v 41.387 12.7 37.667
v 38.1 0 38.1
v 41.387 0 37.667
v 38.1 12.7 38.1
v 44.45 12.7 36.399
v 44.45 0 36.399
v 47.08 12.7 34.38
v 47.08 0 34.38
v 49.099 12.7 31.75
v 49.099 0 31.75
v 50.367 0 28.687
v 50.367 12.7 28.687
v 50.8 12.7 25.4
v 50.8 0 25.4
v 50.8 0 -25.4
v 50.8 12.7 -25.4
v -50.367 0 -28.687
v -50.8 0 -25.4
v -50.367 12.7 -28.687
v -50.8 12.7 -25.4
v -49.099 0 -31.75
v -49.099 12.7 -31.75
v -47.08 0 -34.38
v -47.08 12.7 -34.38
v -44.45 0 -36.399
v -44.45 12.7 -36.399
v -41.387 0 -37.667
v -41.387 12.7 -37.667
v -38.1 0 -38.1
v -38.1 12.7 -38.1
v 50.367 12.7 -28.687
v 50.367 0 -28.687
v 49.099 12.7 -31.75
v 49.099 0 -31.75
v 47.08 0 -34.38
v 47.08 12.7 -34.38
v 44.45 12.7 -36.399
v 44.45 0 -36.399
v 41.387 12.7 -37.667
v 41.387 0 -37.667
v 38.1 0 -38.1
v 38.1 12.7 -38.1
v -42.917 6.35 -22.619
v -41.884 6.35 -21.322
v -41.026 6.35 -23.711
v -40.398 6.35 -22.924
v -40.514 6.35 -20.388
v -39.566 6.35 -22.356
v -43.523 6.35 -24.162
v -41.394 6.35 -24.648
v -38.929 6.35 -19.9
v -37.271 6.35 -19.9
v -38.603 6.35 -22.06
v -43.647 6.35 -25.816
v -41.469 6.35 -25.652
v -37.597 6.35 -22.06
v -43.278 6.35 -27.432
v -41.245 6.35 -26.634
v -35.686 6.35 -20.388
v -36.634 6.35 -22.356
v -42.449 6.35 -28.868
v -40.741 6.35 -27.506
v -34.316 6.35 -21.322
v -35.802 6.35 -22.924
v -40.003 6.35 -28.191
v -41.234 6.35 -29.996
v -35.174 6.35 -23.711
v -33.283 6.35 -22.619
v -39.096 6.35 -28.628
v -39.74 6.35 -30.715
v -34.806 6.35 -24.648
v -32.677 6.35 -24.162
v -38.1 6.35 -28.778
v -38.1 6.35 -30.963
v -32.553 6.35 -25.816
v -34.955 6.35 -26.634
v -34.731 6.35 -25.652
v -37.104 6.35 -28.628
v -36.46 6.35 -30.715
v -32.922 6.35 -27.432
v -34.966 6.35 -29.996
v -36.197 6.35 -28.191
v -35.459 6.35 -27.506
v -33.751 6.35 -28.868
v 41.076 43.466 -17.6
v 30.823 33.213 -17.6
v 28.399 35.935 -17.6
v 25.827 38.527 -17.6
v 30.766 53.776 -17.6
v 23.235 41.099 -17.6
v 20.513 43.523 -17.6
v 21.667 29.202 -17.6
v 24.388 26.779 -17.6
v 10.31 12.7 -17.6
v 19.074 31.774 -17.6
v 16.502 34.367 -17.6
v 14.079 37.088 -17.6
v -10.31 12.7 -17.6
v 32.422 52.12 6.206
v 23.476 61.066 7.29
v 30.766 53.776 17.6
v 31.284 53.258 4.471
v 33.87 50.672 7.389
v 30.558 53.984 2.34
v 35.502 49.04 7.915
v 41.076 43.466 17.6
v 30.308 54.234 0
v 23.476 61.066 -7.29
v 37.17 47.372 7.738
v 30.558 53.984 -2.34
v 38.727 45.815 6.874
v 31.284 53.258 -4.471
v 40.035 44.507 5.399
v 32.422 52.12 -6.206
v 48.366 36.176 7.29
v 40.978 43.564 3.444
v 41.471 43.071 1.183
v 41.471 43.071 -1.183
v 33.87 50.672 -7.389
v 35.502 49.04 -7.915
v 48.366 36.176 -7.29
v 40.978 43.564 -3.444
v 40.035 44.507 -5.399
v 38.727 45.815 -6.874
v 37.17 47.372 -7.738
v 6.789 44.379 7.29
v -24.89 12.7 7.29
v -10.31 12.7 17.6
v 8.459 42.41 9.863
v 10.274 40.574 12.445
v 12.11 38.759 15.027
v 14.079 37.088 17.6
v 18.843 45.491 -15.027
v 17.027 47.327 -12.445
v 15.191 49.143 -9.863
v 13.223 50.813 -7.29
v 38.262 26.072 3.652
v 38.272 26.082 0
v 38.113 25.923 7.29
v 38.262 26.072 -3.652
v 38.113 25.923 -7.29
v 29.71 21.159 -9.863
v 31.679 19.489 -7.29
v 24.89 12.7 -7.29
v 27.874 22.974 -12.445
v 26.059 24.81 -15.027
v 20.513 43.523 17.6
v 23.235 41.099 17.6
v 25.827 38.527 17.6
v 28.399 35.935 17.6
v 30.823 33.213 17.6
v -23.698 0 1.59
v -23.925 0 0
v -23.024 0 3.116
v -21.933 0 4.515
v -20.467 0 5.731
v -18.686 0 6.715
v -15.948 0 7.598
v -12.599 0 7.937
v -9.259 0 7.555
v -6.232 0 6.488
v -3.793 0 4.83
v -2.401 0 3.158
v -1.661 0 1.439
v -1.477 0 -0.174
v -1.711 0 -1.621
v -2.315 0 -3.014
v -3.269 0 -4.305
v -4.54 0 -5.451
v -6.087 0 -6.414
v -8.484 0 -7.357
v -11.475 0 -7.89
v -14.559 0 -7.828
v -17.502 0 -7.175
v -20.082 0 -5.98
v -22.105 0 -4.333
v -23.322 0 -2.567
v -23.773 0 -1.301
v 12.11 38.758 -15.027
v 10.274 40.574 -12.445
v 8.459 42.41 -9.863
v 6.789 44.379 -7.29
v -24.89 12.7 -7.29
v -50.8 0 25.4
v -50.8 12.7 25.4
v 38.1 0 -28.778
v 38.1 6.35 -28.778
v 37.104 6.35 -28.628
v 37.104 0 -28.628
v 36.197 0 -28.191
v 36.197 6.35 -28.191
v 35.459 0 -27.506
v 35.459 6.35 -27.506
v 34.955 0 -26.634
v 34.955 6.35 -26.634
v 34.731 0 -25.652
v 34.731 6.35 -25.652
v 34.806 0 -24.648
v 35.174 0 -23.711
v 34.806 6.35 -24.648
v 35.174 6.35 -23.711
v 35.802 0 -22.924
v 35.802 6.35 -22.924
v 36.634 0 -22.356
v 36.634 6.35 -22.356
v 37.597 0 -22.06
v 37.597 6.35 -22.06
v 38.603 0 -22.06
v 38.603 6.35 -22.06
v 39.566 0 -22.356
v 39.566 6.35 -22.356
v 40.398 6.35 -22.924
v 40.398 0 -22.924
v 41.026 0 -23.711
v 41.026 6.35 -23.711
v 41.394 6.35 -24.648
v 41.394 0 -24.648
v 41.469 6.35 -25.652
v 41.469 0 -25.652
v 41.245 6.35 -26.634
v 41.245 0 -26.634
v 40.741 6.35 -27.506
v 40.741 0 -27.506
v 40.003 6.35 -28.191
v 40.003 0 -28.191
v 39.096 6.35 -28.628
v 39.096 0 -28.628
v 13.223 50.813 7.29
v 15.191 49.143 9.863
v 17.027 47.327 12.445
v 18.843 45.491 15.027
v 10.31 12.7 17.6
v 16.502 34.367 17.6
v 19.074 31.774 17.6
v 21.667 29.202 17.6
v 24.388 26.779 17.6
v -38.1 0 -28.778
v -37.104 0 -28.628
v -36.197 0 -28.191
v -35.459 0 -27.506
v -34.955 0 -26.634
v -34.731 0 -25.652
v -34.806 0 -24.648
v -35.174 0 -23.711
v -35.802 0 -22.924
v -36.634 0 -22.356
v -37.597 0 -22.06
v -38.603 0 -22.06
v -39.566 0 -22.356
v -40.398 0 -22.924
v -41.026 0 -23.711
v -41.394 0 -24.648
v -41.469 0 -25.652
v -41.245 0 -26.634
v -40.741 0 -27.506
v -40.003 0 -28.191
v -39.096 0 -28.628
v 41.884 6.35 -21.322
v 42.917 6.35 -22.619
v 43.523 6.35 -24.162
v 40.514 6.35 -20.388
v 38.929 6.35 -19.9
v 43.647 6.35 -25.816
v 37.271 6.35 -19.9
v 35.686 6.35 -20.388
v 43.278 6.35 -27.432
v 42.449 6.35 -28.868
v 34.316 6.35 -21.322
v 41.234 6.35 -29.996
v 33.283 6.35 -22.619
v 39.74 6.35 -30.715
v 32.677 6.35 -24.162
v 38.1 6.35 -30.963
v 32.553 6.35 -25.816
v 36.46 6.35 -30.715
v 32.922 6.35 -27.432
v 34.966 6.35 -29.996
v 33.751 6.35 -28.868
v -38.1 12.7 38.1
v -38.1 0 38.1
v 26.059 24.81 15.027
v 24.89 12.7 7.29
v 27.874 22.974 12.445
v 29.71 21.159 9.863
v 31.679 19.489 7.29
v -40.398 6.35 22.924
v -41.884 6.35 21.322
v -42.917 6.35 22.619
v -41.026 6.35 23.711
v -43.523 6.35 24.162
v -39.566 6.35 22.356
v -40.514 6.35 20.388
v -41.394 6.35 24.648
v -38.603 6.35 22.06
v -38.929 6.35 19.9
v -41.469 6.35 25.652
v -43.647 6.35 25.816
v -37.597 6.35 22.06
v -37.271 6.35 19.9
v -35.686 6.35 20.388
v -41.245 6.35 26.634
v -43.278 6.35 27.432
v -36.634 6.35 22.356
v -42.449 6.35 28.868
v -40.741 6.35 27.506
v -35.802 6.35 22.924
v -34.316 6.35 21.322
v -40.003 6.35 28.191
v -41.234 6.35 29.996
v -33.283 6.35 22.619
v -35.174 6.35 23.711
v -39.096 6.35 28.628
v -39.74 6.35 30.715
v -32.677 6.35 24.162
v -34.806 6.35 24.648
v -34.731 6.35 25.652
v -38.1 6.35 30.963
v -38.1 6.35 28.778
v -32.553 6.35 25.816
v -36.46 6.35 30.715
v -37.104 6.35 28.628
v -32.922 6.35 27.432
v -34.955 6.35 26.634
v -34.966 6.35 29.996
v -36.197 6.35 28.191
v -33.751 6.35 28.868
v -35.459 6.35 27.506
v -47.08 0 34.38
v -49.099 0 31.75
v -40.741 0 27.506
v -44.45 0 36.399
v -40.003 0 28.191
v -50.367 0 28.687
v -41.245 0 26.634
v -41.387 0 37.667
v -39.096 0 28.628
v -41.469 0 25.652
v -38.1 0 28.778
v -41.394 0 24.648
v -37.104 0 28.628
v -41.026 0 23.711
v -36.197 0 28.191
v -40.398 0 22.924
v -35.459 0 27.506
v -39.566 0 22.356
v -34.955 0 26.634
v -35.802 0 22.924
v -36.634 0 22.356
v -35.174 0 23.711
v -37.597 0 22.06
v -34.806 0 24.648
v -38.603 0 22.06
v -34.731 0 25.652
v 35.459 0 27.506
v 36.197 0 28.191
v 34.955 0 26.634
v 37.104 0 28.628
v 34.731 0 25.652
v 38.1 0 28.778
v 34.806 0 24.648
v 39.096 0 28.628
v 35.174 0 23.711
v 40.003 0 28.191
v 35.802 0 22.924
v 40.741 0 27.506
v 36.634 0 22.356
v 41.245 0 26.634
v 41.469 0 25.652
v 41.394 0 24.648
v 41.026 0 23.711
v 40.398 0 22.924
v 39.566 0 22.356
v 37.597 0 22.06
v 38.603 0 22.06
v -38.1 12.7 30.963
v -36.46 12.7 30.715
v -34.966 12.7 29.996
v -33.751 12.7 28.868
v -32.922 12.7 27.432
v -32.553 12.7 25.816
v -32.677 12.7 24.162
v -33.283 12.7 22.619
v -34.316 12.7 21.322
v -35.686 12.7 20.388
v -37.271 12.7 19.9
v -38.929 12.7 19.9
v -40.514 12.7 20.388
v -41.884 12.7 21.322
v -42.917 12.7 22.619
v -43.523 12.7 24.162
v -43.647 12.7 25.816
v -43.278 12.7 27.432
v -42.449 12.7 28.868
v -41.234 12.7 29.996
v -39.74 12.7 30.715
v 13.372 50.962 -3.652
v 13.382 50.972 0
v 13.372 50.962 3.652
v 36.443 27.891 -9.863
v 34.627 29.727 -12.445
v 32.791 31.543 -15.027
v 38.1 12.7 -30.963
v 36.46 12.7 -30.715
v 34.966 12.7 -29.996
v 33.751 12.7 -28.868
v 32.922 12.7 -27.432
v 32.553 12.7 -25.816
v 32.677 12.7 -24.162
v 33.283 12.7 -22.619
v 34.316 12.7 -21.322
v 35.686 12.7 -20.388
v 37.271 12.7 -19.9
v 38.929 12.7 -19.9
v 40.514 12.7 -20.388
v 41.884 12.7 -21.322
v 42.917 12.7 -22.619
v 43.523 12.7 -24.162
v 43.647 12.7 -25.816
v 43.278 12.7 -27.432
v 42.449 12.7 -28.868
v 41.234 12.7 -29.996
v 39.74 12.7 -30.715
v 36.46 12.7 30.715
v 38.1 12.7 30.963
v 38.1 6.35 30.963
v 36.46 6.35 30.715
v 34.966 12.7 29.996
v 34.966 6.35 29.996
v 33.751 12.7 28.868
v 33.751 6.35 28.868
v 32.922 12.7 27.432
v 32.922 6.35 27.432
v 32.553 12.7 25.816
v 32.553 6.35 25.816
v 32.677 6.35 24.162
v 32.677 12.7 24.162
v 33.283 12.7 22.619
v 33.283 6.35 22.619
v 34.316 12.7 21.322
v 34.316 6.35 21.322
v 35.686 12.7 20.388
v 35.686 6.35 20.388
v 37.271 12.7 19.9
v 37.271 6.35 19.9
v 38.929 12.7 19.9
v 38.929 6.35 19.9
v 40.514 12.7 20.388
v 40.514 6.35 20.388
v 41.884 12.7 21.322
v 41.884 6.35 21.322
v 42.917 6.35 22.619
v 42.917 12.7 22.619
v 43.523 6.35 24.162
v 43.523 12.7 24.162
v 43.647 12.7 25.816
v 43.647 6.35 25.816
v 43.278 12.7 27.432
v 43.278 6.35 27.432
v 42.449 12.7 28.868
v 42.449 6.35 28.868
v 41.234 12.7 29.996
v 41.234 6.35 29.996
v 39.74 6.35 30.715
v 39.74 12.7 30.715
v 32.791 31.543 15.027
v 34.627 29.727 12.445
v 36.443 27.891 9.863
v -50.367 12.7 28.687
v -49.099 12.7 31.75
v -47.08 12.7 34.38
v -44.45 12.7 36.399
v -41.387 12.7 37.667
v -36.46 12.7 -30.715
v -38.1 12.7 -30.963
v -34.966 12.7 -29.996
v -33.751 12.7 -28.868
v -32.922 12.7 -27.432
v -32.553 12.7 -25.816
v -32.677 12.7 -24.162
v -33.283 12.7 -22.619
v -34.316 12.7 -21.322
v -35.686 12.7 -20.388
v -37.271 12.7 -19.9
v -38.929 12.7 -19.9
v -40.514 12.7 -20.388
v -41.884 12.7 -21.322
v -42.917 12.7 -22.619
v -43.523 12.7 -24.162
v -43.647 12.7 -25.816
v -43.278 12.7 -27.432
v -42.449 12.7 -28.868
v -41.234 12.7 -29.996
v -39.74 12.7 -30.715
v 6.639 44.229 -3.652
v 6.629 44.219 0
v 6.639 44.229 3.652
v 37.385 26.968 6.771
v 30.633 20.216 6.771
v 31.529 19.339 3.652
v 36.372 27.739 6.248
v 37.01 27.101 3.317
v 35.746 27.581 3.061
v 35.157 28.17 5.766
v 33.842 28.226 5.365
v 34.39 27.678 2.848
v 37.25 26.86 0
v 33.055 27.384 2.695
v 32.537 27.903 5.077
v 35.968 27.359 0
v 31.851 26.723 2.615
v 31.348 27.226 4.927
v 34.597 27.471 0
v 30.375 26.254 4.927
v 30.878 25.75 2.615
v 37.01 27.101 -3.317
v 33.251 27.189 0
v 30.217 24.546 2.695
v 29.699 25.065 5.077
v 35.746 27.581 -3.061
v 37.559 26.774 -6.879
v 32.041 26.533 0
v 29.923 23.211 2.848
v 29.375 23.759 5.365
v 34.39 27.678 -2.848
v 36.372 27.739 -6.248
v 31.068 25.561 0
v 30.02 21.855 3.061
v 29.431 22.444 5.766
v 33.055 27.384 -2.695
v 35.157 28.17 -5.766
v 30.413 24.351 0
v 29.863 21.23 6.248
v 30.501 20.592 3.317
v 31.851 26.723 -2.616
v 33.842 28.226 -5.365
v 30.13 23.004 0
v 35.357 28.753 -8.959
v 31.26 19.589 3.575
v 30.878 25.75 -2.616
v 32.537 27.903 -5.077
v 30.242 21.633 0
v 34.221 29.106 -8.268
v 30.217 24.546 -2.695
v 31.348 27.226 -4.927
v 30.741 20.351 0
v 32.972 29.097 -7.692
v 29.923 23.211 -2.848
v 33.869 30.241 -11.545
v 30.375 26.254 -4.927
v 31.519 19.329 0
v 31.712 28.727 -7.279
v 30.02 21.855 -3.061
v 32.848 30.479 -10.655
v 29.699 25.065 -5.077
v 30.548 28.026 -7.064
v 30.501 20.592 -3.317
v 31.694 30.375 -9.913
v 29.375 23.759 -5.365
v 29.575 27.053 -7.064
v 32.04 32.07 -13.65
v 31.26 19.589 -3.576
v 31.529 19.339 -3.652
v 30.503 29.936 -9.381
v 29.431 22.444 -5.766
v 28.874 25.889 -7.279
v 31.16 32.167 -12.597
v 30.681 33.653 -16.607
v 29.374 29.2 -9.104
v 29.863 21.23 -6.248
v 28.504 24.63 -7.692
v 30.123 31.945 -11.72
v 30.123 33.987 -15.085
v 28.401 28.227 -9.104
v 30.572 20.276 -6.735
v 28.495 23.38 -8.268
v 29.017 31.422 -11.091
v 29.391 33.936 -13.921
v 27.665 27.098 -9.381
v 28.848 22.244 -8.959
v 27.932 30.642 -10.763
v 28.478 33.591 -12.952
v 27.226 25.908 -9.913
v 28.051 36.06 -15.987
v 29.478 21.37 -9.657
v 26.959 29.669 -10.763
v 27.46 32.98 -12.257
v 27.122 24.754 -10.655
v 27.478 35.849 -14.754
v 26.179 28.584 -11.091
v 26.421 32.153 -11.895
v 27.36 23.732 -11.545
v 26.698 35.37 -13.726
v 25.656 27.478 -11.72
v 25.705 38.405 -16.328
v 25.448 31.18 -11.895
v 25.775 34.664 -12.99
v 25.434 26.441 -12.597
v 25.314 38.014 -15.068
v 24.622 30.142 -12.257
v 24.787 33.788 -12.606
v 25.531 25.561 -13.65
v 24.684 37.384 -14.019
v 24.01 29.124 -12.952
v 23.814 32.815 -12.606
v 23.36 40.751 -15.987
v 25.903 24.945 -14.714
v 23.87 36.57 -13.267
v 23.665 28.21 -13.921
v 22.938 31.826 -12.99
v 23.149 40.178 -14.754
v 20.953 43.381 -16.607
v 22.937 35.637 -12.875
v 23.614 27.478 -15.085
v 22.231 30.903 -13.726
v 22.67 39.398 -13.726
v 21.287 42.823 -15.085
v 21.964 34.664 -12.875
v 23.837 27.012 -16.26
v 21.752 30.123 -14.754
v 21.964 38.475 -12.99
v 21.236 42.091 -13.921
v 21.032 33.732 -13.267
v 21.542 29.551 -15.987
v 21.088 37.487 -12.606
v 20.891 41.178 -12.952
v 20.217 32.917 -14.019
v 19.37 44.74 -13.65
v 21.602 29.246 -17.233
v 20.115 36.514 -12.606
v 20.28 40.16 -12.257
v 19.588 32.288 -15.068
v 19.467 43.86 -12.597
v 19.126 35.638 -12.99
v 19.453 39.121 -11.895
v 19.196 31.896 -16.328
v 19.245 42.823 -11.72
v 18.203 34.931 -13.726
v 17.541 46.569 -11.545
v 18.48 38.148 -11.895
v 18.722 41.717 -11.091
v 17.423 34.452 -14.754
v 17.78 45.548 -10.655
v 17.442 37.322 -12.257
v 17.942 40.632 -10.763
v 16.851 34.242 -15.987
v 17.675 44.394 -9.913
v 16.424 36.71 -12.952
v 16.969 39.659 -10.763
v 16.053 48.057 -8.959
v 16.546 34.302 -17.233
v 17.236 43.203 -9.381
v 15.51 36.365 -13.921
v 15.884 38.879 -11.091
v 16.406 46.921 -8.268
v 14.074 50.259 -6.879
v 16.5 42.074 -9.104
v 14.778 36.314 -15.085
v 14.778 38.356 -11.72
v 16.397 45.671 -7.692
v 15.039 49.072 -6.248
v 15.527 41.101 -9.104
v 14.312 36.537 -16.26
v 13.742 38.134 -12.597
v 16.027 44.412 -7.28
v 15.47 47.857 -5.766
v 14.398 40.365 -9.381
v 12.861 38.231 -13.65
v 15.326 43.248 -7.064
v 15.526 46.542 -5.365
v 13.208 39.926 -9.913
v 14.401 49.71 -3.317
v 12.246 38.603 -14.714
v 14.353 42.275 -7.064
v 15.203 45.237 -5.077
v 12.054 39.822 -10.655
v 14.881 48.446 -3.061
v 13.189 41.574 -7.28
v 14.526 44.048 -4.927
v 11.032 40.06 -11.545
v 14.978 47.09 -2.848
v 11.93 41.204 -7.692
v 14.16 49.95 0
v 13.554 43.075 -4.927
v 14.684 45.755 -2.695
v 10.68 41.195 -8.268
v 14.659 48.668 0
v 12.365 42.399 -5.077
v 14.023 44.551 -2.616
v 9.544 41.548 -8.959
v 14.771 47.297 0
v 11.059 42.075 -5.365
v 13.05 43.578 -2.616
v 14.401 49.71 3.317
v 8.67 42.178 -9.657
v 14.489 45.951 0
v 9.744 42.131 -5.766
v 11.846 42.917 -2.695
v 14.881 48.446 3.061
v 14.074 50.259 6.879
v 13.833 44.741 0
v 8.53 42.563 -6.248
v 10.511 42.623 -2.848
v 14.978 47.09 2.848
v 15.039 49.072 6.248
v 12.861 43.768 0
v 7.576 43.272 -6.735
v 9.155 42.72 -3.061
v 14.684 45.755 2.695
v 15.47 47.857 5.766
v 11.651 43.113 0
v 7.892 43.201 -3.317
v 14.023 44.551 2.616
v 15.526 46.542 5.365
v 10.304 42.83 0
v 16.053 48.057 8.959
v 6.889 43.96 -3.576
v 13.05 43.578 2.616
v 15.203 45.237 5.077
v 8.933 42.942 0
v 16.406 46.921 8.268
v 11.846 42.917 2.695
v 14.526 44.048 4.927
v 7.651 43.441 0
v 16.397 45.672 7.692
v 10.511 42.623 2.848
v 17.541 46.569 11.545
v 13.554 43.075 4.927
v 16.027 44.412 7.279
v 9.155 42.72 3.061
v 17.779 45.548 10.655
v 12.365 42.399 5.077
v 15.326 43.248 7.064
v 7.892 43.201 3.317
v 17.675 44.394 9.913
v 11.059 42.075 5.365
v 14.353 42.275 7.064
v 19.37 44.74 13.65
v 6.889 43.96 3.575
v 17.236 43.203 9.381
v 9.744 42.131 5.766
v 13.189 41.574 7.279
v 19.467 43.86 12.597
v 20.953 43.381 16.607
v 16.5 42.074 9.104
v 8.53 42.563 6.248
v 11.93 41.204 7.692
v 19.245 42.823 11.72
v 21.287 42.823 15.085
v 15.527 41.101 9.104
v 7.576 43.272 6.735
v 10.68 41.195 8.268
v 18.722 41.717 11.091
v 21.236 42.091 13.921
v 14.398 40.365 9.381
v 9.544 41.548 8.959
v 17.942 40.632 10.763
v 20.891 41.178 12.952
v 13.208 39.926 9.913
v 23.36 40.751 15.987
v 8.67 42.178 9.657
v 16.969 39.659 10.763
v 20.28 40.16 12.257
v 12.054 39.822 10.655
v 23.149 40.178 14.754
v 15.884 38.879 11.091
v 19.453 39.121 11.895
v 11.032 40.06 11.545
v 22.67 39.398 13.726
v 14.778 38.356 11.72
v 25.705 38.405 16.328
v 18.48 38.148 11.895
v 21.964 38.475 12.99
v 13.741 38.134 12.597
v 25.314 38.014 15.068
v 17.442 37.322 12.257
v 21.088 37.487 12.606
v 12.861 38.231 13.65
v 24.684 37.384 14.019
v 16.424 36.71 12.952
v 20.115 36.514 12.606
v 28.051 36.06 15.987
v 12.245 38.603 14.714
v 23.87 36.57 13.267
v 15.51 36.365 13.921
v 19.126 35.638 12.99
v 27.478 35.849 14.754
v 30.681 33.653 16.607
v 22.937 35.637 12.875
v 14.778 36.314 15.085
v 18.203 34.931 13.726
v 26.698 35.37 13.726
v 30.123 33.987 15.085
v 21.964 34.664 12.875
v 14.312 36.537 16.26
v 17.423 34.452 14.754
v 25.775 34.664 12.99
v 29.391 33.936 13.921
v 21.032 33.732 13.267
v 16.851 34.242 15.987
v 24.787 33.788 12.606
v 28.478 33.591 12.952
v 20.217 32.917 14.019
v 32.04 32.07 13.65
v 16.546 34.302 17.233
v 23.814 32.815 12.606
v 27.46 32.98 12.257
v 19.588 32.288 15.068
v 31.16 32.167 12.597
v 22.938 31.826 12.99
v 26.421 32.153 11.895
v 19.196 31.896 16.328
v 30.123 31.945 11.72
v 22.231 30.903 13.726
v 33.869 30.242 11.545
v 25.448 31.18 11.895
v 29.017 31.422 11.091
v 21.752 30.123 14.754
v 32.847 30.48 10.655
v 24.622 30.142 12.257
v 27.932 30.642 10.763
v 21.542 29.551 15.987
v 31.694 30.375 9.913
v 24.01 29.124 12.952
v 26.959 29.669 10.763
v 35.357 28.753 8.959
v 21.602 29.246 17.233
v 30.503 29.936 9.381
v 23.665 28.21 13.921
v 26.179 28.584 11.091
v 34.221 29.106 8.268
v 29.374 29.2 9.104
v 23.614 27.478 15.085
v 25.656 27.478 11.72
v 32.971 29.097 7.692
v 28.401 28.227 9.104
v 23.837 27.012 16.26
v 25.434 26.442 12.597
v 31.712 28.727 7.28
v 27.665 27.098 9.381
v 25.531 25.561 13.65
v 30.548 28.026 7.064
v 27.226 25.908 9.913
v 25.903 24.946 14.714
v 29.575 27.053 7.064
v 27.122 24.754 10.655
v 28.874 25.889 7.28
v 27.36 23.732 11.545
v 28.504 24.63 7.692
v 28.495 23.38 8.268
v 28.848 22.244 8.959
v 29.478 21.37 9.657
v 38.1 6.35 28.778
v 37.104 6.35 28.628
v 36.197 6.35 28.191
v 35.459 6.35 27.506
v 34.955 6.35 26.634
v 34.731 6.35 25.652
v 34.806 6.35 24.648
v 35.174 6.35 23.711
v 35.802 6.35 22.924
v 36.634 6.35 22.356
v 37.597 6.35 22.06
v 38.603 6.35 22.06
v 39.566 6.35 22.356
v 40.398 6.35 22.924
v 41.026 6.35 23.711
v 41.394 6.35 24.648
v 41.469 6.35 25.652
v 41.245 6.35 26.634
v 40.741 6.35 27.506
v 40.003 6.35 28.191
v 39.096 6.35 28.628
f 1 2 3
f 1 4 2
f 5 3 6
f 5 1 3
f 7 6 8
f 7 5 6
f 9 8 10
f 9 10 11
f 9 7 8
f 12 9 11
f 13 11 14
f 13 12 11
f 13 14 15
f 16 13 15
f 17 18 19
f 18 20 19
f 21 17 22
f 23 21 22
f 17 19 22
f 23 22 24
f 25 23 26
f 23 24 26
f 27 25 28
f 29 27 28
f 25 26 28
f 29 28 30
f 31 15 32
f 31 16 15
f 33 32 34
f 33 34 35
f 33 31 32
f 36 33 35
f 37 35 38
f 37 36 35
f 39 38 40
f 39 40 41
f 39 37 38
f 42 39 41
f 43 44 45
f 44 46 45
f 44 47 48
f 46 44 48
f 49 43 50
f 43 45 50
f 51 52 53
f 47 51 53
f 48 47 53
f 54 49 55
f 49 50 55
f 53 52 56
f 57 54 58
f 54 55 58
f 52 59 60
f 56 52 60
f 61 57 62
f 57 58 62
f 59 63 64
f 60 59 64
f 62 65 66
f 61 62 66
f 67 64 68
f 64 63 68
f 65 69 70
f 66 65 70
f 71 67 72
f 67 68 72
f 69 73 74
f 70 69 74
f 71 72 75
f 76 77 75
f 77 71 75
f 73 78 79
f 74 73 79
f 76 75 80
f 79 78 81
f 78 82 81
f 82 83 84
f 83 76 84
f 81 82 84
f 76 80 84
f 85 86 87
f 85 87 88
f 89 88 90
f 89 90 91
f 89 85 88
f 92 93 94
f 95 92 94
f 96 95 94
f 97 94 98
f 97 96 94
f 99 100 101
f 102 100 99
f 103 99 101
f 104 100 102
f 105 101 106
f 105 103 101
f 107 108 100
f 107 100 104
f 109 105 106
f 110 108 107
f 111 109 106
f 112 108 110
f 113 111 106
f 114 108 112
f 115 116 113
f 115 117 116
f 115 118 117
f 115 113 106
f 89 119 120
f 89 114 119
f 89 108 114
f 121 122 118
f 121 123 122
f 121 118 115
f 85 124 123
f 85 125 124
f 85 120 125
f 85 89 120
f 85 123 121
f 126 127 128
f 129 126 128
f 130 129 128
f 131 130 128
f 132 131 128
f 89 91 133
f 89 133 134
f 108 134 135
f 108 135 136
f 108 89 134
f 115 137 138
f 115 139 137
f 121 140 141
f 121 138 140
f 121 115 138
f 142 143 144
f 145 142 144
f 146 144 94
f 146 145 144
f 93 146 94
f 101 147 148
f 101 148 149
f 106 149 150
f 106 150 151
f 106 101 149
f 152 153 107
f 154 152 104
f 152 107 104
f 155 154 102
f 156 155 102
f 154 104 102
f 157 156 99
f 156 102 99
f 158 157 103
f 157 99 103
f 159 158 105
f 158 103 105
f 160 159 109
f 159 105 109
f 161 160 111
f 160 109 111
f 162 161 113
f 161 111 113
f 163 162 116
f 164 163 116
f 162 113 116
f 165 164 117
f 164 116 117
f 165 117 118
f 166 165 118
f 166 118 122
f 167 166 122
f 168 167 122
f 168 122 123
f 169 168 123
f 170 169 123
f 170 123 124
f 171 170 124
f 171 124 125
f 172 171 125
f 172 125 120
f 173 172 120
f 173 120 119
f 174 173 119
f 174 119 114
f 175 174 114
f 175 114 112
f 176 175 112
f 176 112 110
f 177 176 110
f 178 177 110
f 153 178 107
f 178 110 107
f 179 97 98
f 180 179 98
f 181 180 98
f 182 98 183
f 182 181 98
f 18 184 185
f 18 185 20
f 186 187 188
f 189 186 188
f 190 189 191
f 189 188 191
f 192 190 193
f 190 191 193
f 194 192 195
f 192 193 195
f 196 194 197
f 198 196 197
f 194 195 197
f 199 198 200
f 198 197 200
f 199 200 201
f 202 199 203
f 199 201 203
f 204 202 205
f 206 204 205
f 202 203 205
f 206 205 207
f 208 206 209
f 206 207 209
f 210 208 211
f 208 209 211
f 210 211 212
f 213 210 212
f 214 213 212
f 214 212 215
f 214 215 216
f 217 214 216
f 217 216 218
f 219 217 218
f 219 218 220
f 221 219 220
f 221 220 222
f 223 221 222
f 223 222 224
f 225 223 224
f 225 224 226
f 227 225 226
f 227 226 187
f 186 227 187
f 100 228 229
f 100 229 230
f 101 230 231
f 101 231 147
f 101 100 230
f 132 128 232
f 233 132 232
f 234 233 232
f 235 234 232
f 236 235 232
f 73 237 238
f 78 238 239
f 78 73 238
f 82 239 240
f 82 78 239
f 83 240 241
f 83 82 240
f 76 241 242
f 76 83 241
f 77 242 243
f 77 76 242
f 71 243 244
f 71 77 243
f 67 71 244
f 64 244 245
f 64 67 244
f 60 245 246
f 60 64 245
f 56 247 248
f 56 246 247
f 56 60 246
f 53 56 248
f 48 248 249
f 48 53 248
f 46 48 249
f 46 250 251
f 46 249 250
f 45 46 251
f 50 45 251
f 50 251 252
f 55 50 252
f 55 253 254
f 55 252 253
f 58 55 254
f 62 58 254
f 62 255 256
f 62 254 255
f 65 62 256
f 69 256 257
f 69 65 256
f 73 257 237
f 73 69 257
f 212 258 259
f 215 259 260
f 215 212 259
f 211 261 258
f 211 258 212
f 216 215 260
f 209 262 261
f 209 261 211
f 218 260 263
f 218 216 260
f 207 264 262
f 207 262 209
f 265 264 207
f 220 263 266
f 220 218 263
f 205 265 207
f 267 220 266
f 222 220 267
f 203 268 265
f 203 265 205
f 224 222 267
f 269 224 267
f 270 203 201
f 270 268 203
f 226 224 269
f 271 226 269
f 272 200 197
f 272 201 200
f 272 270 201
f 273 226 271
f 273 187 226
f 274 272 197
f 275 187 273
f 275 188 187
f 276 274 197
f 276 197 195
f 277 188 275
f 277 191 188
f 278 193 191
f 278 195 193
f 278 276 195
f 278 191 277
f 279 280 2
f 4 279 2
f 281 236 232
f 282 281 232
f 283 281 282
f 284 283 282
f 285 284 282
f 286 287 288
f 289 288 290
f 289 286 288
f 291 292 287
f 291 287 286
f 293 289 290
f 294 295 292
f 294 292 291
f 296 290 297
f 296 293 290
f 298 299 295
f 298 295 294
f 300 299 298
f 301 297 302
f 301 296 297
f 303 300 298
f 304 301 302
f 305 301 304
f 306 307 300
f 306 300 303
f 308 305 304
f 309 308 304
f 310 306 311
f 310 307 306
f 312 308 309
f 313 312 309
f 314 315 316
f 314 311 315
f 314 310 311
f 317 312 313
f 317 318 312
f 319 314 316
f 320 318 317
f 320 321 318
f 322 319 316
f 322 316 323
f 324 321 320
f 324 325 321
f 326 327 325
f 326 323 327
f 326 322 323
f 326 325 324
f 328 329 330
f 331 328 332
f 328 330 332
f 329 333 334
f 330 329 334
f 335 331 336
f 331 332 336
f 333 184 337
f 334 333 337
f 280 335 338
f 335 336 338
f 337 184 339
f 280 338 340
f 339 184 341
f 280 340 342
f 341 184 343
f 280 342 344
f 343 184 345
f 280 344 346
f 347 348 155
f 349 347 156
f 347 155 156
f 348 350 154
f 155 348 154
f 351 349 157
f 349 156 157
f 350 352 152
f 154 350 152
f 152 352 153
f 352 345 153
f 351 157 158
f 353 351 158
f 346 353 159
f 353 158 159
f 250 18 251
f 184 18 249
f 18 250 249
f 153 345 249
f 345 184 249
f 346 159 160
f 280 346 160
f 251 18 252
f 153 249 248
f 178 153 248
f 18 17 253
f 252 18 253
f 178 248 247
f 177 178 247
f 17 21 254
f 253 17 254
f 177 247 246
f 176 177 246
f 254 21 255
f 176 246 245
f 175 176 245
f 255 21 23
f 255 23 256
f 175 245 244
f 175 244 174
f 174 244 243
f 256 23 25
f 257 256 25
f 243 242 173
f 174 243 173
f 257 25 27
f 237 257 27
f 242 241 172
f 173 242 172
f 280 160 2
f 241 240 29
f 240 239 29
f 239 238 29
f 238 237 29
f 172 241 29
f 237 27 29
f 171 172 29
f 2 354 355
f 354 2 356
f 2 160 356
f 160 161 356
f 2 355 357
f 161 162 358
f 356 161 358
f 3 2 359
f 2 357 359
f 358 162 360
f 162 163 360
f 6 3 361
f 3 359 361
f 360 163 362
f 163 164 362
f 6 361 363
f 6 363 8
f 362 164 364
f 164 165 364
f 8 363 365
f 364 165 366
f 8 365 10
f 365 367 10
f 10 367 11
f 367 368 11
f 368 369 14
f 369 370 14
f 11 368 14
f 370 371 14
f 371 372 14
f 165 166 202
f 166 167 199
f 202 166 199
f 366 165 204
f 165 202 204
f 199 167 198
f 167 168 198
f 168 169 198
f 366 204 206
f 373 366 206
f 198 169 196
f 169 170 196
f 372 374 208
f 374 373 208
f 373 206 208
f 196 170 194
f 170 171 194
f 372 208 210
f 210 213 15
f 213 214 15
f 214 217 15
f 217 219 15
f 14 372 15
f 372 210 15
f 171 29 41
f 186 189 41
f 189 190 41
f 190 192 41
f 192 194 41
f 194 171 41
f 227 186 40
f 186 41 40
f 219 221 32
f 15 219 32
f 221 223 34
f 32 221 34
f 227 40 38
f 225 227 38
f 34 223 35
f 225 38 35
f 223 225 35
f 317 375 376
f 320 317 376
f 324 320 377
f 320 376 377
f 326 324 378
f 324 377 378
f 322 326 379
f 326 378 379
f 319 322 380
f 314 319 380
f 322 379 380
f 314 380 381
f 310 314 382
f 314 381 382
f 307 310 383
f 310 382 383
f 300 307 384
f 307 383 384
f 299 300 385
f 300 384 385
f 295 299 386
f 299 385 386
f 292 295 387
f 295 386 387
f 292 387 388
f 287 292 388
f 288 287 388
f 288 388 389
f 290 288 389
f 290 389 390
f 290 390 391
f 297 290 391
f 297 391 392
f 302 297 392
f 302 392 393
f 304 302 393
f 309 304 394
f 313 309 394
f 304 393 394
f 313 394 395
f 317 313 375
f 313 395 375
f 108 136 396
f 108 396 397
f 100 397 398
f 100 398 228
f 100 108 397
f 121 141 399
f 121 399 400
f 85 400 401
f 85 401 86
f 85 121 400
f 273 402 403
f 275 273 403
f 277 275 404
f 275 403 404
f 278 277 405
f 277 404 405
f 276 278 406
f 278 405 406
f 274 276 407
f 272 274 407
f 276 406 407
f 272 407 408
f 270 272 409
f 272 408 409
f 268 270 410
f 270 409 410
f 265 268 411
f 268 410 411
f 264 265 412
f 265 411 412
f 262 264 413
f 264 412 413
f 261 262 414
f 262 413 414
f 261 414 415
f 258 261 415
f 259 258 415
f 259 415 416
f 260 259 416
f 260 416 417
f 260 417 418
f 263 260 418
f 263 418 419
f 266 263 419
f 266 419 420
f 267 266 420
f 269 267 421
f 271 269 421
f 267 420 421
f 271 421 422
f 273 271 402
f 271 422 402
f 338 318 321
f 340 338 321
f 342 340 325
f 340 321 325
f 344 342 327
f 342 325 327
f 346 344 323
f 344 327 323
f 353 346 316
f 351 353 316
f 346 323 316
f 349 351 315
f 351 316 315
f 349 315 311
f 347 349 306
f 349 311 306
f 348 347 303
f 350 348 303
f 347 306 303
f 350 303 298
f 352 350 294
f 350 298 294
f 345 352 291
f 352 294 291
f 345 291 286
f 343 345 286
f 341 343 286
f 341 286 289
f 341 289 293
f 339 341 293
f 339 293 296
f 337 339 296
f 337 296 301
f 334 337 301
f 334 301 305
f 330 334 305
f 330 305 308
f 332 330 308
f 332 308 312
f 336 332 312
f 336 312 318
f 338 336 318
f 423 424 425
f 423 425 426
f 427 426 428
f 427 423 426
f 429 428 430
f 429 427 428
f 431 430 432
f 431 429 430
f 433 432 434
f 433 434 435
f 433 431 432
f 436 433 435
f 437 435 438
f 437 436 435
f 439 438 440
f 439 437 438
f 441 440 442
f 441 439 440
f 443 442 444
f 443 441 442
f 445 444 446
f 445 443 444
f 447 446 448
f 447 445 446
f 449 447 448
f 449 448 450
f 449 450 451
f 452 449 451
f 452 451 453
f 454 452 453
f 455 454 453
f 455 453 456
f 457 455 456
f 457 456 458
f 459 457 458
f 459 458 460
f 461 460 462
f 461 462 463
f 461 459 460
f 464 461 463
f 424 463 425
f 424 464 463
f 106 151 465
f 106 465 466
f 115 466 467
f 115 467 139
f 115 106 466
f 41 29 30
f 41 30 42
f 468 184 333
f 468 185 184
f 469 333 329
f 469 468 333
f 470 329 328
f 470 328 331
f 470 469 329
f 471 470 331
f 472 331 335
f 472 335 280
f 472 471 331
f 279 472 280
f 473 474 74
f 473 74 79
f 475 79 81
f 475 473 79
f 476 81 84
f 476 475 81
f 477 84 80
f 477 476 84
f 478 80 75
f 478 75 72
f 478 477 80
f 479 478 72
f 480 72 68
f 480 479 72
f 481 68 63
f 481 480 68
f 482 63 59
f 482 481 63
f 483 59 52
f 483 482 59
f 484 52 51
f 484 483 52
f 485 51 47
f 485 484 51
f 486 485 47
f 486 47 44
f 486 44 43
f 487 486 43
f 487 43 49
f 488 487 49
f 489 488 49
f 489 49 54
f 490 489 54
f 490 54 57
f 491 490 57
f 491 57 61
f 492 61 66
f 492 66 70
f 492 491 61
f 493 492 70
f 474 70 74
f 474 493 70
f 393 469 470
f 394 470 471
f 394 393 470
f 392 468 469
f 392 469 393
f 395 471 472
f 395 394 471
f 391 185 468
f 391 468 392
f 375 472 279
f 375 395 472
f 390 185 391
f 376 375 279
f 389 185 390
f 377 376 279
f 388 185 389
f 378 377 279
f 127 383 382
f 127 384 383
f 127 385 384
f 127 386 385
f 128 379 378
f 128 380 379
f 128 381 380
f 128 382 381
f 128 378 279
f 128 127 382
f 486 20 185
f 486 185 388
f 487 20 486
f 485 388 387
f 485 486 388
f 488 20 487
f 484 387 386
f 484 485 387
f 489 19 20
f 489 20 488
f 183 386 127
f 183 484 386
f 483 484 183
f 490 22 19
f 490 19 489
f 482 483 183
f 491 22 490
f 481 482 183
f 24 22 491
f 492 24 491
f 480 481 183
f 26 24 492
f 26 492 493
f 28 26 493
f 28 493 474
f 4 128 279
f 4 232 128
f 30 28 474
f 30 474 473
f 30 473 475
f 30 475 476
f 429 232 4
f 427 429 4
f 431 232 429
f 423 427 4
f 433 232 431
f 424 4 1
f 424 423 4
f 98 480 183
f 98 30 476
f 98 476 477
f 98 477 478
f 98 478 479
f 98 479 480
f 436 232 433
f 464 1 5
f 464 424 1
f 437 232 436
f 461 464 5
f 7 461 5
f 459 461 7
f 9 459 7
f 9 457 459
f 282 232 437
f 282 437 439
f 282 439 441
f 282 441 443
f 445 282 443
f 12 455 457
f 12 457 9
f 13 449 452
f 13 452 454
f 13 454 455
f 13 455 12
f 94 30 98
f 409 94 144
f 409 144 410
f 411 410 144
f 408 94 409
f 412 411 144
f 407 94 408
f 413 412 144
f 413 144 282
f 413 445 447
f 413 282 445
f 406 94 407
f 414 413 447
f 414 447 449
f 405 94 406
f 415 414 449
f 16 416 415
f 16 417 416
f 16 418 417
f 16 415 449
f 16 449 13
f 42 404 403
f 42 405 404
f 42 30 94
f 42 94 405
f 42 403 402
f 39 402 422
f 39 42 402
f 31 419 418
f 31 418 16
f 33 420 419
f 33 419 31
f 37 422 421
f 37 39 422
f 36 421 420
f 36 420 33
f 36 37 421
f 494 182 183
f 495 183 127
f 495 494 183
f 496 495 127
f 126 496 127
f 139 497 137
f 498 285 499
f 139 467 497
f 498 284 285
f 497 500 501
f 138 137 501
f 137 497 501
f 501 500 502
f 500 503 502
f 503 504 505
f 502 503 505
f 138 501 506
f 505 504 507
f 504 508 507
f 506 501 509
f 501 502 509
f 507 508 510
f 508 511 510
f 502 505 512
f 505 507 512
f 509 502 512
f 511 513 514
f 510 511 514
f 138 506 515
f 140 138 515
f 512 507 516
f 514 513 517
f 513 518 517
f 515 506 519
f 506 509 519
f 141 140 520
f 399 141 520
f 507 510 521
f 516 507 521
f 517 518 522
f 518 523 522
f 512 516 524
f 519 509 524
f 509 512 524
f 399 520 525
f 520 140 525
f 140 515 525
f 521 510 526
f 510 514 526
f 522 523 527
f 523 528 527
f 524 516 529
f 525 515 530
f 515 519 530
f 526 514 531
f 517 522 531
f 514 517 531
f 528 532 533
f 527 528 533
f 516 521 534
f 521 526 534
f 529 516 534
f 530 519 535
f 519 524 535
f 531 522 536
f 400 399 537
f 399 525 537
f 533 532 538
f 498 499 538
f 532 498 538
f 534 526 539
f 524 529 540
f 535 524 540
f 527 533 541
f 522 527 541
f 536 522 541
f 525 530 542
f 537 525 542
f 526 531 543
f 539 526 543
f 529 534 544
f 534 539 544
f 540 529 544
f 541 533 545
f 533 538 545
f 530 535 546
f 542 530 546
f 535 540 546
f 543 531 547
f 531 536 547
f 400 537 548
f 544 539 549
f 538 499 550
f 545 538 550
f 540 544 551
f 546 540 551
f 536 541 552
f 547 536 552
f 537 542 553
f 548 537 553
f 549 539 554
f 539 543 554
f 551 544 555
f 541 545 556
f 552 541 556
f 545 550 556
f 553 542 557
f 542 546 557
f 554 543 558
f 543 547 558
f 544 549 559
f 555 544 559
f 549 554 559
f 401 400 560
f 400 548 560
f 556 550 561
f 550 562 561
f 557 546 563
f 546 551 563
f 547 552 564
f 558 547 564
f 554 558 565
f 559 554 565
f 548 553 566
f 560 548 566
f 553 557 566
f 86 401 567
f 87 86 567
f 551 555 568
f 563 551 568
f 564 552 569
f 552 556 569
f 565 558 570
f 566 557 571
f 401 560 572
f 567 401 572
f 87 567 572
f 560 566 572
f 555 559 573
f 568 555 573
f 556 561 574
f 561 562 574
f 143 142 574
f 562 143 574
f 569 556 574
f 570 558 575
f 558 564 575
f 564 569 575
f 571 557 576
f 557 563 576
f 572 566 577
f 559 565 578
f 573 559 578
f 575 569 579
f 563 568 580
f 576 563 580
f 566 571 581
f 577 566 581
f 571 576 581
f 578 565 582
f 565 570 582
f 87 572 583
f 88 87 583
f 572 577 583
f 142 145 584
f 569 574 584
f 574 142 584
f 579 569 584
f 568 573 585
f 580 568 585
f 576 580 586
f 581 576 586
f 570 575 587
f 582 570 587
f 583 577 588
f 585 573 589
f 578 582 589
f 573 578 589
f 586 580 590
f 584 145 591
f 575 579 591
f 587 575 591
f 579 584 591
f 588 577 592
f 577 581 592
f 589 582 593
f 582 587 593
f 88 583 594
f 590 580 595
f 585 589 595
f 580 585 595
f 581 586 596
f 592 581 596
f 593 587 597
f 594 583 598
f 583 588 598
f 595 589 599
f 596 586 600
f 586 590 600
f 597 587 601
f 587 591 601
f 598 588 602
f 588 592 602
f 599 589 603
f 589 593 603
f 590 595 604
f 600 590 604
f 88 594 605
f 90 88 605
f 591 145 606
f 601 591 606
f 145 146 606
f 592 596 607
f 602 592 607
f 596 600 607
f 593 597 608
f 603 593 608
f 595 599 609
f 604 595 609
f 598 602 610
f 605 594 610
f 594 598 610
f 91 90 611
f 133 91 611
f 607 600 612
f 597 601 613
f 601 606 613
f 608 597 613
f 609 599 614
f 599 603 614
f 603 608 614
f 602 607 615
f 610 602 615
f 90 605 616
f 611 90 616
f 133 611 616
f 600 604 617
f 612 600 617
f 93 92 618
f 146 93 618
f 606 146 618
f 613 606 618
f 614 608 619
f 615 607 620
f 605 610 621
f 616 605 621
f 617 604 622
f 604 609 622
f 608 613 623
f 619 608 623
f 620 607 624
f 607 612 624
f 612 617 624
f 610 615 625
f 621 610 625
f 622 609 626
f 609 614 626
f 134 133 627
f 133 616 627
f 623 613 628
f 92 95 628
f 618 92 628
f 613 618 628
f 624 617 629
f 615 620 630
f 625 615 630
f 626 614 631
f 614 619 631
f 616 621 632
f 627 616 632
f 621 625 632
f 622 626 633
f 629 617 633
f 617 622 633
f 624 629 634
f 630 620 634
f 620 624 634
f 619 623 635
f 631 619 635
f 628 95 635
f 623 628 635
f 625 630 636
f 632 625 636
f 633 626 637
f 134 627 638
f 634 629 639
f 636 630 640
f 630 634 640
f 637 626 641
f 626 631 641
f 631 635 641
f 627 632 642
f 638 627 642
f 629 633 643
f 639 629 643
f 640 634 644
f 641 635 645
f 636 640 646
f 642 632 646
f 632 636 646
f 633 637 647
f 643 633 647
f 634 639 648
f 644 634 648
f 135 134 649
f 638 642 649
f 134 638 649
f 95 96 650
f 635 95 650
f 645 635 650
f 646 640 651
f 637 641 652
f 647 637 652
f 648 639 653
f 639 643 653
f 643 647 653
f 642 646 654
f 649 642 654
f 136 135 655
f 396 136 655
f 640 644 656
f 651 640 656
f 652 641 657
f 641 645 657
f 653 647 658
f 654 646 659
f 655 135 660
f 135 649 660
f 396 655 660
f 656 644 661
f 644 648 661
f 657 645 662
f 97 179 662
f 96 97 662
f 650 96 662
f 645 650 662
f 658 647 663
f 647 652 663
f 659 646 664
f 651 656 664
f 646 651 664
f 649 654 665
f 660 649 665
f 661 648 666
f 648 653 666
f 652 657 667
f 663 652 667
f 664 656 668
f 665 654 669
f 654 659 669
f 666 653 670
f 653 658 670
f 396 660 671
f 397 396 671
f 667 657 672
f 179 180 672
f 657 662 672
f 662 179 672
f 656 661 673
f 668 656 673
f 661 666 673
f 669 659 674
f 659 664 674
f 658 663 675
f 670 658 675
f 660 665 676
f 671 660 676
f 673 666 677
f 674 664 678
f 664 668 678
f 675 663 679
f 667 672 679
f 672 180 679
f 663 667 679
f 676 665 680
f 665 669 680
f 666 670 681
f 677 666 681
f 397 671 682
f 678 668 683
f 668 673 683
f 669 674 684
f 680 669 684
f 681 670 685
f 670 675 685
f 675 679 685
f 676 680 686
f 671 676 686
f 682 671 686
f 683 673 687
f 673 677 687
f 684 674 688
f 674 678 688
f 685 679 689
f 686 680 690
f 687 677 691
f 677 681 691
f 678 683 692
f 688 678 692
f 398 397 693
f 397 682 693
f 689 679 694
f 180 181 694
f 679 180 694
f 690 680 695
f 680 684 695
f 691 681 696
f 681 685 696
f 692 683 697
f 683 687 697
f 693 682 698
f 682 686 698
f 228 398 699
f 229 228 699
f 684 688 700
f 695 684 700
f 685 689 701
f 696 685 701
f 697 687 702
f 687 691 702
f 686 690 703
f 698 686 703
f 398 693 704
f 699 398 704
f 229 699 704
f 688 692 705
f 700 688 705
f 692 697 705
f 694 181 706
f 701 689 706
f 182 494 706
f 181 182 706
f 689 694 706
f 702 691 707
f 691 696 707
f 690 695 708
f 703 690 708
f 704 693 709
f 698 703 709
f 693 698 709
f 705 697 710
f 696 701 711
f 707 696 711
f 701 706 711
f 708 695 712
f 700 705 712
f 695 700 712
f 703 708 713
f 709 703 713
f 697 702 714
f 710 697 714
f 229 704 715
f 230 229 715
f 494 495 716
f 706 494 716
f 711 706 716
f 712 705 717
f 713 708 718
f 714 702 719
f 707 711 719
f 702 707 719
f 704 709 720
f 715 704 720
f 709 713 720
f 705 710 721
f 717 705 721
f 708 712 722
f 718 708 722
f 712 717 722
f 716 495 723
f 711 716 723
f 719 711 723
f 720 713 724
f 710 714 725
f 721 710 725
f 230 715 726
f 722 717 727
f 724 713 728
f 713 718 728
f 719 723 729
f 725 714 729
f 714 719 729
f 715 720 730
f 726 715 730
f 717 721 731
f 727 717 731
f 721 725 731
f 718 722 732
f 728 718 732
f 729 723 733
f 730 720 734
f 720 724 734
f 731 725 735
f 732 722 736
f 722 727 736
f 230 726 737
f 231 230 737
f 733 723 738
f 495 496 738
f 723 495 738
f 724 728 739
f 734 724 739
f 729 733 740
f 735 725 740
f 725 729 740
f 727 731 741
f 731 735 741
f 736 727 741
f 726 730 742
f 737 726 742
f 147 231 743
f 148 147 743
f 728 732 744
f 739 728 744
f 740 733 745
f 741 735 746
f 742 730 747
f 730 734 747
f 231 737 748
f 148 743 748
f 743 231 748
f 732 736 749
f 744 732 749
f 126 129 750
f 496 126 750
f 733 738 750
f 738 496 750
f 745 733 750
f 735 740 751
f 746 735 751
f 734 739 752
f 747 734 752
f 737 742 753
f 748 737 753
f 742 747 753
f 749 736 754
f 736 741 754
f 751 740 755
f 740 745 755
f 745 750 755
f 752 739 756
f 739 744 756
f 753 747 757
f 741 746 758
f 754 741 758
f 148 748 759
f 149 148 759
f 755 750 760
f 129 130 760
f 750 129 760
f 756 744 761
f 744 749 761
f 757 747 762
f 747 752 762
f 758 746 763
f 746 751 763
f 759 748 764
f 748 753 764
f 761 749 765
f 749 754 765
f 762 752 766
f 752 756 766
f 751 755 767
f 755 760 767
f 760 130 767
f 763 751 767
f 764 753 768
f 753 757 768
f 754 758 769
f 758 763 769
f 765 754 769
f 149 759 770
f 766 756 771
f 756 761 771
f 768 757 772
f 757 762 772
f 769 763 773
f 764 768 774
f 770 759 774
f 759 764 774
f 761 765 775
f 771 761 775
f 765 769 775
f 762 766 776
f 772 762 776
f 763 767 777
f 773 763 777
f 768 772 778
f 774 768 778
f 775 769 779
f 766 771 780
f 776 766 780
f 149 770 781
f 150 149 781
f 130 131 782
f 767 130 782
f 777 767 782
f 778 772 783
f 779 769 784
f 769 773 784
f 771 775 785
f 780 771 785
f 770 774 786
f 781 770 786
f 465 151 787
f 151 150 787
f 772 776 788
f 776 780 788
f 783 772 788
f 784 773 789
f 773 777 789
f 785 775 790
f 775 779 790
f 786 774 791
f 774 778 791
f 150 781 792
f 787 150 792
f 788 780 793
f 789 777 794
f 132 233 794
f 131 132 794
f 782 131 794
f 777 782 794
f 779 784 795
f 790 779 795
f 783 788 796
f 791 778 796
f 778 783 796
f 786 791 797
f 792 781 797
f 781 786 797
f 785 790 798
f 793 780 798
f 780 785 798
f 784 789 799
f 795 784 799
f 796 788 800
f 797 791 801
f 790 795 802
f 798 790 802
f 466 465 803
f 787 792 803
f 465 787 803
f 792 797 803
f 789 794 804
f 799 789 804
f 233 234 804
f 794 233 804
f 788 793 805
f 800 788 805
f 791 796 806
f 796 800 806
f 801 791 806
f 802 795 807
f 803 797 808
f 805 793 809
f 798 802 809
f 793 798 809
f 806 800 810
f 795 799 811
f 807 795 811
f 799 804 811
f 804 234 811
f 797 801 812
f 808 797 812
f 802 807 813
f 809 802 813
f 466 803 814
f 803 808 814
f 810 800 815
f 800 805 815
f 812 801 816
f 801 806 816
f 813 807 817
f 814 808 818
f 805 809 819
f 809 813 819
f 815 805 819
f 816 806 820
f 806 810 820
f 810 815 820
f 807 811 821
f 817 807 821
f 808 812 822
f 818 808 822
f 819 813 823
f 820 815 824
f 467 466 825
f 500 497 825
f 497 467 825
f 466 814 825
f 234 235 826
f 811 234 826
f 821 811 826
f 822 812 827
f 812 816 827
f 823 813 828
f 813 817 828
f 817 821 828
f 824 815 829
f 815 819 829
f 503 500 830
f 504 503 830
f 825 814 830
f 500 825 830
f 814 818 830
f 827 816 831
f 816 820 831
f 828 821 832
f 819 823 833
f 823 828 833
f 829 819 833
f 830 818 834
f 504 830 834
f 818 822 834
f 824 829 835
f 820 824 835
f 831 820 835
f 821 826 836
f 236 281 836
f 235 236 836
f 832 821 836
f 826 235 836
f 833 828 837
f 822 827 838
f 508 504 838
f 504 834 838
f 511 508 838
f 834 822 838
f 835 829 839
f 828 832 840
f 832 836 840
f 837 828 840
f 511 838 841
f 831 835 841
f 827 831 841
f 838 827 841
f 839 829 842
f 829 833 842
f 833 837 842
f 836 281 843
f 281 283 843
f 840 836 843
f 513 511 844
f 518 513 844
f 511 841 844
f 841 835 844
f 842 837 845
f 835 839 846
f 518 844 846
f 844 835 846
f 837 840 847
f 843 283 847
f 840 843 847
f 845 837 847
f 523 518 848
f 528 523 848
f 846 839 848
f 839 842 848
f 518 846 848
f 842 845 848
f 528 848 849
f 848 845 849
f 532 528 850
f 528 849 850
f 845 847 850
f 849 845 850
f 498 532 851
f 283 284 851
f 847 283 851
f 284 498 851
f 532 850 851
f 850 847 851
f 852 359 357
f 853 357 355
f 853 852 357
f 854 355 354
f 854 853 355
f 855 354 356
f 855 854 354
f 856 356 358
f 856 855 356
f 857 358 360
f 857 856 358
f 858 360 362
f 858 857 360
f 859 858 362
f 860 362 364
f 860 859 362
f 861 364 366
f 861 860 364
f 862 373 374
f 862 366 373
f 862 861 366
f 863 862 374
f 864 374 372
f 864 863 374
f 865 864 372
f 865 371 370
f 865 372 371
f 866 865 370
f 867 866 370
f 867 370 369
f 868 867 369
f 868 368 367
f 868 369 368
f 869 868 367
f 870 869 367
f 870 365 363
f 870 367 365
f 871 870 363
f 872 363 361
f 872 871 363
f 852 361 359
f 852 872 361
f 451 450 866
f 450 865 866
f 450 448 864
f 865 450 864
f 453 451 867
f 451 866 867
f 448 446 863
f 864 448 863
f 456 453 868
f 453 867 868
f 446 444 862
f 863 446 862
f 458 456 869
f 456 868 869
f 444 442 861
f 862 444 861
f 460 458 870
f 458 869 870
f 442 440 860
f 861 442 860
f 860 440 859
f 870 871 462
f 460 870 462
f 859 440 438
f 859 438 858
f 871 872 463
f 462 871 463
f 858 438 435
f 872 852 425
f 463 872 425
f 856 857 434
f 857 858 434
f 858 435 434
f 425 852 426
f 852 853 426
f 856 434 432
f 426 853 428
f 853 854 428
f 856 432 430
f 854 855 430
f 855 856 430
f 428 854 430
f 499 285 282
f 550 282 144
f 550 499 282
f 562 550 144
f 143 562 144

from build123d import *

# Parameters (mm, degrees)
BOTTOM_SKETCH_W                   = 101.6
BOTTOM_SKETCH_H                   = 76.2
BASE_EXTRUDE_DEPTH                = 12.7
CORNER_FILLETS_R                  = 12.7
TOP_CIRCULAR_SKETCH_R             = 5.5626
TOP_CIRCULAR_CUT_DEPTH            = 6.35
BOTTOM_CIRCULAR_SKETCH_R          = 3.3782
BOTTOM_CIRCULAR_CUT_DEPTH         = 64.816710194
HORIZONTAL_MIRROR_COPY_1_SKETCH_R = 5.5626
HORIZONTAL_MIRROR_COPY_1_DEPTH    = 6.35
HORIZONTAL_MIRROR_COPY_2_SKETCH_R = 3.3782
HORIZONTAL_MIRROR_COPY_2_DEPTH    = 64.816710194
OCTAGONAL_EXTRUDE_REACH           = 108.471
CENTER_SKETCH_R                   = 7.9375
CENTER_CUT_DEPTH                  = 110.090169628
RADIUS_SKETCH_R                   = 4.7752


with BuildPart() as part:
    # Bottom Sketch → Base Extrude (new body)
    with BuildSketch(Plane(origin=(0, 0, 0), x_dir=(1, 0, 0), z_dir=(0, 1, 0))):
        Rectangle(BOTTOM_SKETCH_W, BOTTOM_SKETCH_H)
    extrude(amount=BASE_EXTRUDE_DEPTH)

    # Corner Fillets
    corner_fillets_edges = [part.edges().sort_by_distance(p)[0] for p in [
        (-50.8, 6.35, -38.1),
        (50.8, 6.35, -38.1),
        (50.8, 6.35, 38.1),
        (-50.8, 6.35, 38.1),
    ]]
    fillet(corner_fillets_edges, radius=CORNER_FILLETS_R)

    # Top Circular Sketch → Top Circular Cut (cut)
    with BuildSketch(Plane(origin=(0, 12.7, 0), x_dir=(1, 0, 0), z_dir=(0, 1, 0))):
        with Locations(Location((-38.1, -25.4, 0), (0, 0, 270))):
            Circle(TOP_CIRCULAR_SKETCH_R)
    top_circular_cut = extrude(amount=-TOP_CIRCULAR_CUT_DEPTH, mode=Mode.SUBTRACT)

    # Bottom Circular Sketch → Bottom Circular Cut (cut, through all)
    with BuildSketch(Plane(origin=(0, 6.35, 0), x_dir=(1, 0, 0), z_dir=(0, 1, 0))):
        with Locations(Location((-38.1, -25.4, 0), (0, 0, 270))):
            Circle(BOTTOM_CIRCULAR_SKETCH_R)
    bottom_circular_cut = extrude(amount=-BOTTOM_CIRCULAR_CUT_DEPTH, mode=Mode.SUBTRACT)

    # Vertical Mirror: Top Circular Cut, Bottom Circular Cut across plane
    add(top_circular_cut.mirror(Plane.XY), mode=Mode.SUBTRACT)
    add(bottom_circular_cut.mirror(Plane.XY), mode=Mode.SUBTRACT)

    # Horizontal Mirror: Top Circular Cut, Bottom Circular Cut across plane
    add(top_circular_cut.mirror(Plane(origin=(0, 0, 0), x_dir=(0, 0, 1), z_dir=(1, 0, 0))), mode=Mode.SUBTRACT)
    add(bottom_circular_cut.mirror(Plane(origin=(0, 0, 0), x_dir=(0, 0, 1), z_dir=(1, 0, 0))), mode=Mode.SUBTRACT)

    # Horizontal Mirror copy 1 sketch → Horizontal Mirror copy 1 (cut)
    with BuildSketch(Plane(origin=(0, 12.7, 0), x_dir=(-1, 0, 0), z_dir=(0, 1, 0))):
        with Locations(Location((-38.1, -25.4, 0), (0, 0, 270))):
            Circle(HORIZONTAL_MIRROR_COPY_1_SKETCH_R)
    extrude(amount=-HORIZONTAL_MIRROR_COPY_1_DEPTH, mode=Mode.SUBTRACT)

    # Horizontal Mirror copy 2 sketch → Horizontal Mirror copy 2 (cut, through all)
    with BuildSketch(Plane(origin=(0, 6.35, 0), x_dir=(-1, 0, 0), z_dir=(0, 1, 0))):
        with Locations(Location((-38.1, -25.4, 0), (0, 0, 270))):
            Circle(HORIZONTAL_MIRROR_COPY_2_SKETCH_R)
    extrude(amount=-HORIZONTAL_MIRROR_COPY_2_DEPTH, mode=Mode.SUBTRACT)

    # Octagonal Extrude: up to this plane
    octagonal_extrude_end = Plane(origin=(0, 12.7, 0), z_dir=(0, 1, 0))
    # Octagonal Sketch → Octagonal Extrude (add, up to the surface)
    with BuildSketch(Plane(origin=(35.921024484, 48.621024484, 0), x_dir=(0.7071067811865488, -0.7071067811865462, 0), z_dir=(0.7071067811865462, 0.7071067811865488, 0)), mode=Mode.PRIVATE) as octagonal_extrude_sk1:
        Polygon((-7.290119387, 17.599905094), (-17.599905094, 7.290119387), (-17.599905094, -7.290119387), (-7.290119387, -17.599905094), (7.290119387, -17.599905094), (17.599905094, -7.290119387), (17.599905094, 7.290119387), (7.290119387, 17.599905094), align=None)
    octagonal_extrude_tool1 = split(extrude(octagonal_extrude_sk1.sketch, amount=-OCTAGONAL_EXTRUDE_REACH, mode=Mode.PRIVATE), bisect_by=octagonal_extrude_end, keep=Keep.BOTH, mode=Mode.PRIVATE)
    add(octagonal_extrude_tool1.solids().sort_by_distance((35.921024, 48.621024, 0))[0])

    # Center Sketch → Center Cut (cut, through all)
    with BuildSketch(Plane(origin=(42.271024484, 42.271024484, 0), x_dir=(0, 0, -1), z_dir=(0.7071067811865465, 0.7071067811865487, 0))):
        with Locations(Location((0, 8.980256121, 0), (0, 0, 90))):
            Circle(CENTER_SKETCH_R)
    extrude(amount=-CENTER_CUT_DEPTH, mode=Mode.SUBTRACT)

    # Radius Sketch → Radial Cut (revolve, cut)
    with BuildSketch(Plane(origin=(-6.35, 6.35, 0), x_dir=(0, 0, 1), z_dir=(-0.7071067811865478, 0.7071067811865472, 0)), mode=Mode.PRIVATE) as radial_cut_sk:
        with Locations((17.599905094, 40.730256121)):
            Circle(RADIUS_SKETCH_R)
    revolve(radial_cut_sk.sketch.rotate(Axis((0, 12.7, 0), (0.7071067811865462, 0.7071067811865488, 0)), 67.500000005), axis=Axis((0, 12.7, 0), (0.7071067811865462, 0.7071067811865488, 0)), mode=Mode.SUBTRACT)


solid = part.part
